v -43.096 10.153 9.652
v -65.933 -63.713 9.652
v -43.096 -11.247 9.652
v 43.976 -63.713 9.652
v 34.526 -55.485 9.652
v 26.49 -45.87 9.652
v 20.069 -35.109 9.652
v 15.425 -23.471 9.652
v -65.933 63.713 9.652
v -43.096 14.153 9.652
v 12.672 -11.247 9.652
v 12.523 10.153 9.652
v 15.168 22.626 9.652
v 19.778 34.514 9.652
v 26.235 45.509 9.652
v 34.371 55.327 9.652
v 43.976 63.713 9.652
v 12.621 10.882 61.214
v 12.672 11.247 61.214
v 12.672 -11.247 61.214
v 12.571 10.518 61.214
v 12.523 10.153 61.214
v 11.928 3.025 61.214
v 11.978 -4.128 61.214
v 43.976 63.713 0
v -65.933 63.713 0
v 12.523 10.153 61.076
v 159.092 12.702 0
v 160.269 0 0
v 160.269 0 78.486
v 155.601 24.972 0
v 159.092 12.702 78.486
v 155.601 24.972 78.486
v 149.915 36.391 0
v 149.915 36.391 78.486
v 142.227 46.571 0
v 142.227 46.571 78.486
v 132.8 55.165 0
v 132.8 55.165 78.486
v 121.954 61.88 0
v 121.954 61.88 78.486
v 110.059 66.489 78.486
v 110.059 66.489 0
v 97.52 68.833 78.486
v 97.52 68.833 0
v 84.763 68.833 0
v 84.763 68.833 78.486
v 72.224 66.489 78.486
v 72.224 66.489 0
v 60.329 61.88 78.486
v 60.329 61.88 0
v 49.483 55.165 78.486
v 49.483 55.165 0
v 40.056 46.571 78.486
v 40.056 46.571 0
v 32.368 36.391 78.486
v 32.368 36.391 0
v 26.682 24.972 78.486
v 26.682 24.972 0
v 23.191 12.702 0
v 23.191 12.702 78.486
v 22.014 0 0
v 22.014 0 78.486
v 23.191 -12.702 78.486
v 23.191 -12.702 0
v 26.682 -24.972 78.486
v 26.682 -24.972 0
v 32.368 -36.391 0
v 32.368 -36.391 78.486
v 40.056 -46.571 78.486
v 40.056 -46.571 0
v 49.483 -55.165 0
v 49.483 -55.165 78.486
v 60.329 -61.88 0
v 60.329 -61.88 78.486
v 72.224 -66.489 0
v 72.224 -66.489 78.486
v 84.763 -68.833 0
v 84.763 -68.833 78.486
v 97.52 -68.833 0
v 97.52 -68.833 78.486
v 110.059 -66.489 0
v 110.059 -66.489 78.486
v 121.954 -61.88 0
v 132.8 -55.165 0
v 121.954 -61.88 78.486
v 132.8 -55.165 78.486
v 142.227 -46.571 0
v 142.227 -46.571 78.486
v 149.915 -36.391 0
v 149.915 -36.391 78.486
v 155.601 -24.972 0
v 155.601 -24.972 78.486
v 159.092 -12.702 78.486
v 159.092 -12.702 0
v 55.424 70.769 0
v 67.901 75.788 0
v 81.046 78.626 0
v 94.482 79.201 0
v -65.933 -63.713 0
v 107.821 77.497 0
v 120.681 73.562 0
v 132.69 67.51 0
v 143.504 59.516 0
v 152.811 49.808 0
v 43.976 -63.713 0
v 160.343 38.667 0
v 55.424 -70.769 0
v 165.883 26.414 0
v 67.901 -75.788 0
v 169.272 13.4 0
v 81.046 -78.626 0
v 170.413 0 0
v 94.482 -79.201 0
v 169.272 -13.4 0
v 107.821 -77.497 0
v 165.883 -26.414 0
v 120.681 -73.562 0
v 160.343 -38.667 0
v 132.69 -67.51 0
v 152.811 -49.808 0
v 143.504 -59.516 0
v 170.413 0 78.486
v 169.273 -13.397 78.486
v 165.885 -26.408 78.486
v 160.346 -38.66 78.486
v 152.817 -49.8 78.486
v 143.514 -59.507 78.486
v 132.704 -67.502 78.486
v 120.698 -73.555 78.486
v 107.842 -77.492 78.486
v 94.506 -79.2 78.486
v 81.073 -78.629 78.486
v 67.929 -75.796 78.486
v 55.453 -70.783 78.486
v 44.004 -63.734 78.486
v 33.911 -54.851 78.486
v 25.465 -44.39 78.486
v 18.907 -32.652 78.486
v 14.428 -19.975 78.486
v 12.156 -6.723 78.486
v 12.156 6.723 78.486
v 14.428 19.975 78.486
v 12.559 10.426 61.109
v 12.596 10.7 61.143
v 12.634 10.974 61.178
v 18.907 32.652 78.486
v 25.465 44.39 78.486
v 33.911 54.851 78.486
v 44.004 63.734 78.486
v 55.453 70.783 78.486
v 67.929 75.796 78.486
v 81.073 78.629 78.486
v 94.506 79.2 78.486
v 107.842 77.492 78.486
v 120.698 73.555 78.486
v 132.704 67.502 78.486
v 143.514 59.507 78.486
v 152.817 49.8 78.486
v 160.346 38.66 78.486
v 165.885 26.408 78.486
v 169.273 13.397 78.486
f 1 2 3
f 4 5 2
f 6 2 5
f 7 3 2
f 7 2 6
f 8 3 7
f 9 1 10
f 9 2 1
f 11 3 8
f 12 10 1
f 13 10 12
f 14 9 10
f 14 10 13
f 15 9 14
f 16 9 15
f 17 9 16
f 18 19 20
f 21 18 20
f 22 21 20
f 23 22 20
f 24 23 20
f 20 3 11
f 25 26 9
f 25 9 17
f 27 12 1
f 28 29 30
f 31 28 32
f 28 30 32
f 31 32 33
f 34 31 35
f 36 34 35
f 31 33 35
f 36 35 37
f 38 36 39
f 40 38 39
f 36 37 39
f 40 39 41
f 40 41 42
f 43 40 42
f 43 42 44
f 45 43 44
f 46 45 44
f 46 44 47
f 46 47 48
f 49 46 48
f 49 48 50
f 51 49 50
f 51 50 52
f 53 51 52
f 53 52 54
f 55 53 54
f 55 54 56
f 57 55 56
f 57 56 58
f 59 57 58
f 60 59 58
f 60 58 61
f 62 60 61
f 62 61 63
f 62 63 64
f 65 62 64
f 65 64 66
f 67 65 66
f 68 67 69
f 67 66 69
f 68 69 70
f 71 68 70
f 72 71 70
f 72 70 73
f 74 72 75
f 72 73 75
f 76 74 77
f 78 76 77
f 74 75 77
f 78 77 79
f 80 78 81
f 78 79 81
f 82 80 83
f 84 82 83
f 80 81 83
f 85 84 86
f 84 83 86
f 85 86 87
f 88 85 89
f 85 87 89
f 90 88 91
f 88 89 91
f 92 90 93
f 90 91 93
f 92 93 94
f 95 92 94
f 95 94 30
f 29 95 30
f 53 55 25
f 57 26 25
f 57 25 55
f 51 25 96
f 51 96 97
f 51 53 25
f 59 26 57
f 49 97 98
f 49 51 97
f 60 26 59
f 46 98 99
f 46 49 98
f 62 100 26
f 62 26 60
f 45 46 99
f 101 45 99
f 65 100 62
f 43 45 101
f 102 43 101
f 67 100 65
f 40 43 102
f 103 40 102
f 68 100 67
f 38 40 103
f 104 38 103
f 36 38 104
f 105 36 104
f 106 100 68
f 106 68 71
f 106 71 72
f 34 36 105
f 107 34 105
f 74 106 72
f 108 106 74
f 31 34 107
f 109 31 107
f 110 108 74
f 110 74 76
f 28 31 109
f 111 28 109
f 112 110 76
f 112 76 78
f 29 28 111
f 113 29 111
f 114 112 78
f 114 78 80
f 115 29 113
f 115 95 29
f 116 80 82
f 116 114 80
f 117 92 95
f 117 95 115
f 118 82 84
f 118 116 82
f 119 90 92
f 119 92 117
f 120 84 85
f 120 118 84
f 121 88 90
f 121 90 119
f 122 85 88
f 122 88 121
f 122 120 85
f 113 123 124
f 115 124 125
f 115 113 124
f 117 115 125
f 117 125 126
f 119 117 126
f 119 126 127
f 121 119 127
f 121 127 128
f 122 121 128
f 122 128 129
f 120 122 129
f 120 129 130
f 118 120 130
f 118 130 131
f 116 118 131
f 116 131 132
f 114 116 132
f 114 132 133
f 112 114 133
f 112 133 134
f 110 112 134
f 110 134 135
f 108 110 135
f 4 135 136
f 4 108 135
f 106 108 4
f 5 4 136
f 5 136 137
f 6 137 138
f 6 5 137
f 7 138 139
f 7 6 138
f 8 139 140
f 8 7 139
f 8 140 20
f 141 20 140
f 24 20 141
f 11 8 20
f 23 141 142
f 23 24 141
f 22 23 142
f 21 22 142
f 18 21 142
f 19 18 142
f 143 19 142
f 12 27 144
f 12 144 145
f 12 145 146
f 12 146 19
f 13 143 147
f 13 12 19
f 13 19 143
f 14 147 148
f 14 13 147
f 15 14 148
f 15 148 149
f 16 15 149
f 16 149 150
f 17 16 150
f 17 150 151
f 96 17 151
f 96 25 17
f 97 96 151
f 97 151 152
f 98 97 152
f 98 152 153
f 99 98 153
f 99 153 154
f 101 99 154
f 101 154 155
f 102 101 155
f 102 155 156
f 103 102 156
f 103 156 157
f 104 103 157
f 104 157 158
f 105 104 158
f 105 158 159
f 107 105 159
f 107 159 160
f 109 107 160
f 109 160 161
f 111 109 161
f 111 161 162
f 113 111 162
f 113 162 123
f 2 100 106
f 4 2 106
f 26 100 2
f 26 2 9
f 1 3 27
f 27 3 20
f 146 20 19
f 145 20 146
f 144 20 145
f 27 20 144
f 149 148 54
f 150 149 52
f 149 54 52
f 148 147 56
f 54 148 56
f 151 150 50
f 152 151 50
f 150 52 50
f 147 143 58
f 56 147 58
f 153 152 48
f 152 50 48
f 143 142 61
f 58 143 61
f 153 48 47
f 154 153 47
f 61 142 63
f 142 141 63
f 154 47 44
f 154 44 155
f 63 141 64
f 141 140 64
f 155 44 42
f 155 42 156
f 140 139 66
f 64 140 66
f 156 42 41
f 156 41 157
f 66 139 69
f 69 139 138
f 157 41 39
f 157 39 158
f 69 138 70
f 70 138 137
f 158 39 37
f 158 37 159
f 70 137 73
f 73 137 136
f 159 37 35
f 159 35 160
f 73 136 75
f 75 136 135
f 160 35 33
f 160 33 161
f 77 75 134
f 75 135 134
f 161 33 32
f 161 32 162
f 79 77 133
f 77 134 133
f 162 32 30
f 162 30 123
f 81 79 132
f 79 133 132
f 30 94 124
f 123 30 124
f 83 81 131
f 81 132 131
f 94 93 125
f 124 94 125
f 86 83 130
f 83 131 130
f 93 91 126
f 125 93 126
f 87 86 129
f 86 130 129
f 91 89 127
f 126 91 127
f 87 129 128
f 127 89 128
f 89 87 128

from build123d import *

# Parameters (mm, degrees)
F0_W     = 131.865278
F0_H     = 127.425716
F1_DEPTH = 9.652
F2_R     = 79.271214
F3_DEPTH = 78.486
F4_R     = 69.127497
F5_DEPTH = 172.974
F7_DEPTH = 51.562
F9_DEPTH = 25.4


with BuildPart() as f1:
    # F0 (on Top) → F1 (new body)
    with BuildSketch(Plane.XY):
        Rectangle(F0_W, F0_H)
    extrude(amount=F1_DEPTH)

    # F2 (on face) → F3 (join)
    with BuildSketch(Plane(origin=(0, 0, 0), x_dir=(1, 0, 0), z_dir=(0, 0, -1))):
        with Locations((91.141589, 0)):
            Circle(F2_R)
    extrude(amount=-F3_DEPTH)

    # F4 (on face) → F5 (cut)
    with BuildSketch(Plane.XY.offset(78.486)):
        with Locations((91.141589, 0)):
            Circle(F4_R)
    extrude(amount=-F5_DEPTH, mode=Mode.SUBTRACT)

    # F6 (on face) → F7 (join)
    with BuildSketch(Plane.XY.offset(9.652)):
        with BuildLine():
            Line((-43.096259, 10.152509), (-43.096259, -11.246967))
            Line((-43.096259, -11.246967), (12.672289, -11.246967))
            ThreePointArc((12.672289, -11.246967), (11.872299, -0.552283), (12.523195, 10.152509))
            Line((12.523195, 10.152509), (-43.096259, 10.152509))
        make_face()
    extrude(amount=F7_DEPTH)

    # F8 (on face) → F9 (cut)
    with BuildSketch(Plane.XZ.offset(11.246967)):
        Polygon((-43.096259, 61.214), (-43.096259, 9.652), (12.672289, 61.214), align=None)
    extrude(amount=-F9_DEPTH, mode=Mode.SUBTRACT)


solid = f1.part
